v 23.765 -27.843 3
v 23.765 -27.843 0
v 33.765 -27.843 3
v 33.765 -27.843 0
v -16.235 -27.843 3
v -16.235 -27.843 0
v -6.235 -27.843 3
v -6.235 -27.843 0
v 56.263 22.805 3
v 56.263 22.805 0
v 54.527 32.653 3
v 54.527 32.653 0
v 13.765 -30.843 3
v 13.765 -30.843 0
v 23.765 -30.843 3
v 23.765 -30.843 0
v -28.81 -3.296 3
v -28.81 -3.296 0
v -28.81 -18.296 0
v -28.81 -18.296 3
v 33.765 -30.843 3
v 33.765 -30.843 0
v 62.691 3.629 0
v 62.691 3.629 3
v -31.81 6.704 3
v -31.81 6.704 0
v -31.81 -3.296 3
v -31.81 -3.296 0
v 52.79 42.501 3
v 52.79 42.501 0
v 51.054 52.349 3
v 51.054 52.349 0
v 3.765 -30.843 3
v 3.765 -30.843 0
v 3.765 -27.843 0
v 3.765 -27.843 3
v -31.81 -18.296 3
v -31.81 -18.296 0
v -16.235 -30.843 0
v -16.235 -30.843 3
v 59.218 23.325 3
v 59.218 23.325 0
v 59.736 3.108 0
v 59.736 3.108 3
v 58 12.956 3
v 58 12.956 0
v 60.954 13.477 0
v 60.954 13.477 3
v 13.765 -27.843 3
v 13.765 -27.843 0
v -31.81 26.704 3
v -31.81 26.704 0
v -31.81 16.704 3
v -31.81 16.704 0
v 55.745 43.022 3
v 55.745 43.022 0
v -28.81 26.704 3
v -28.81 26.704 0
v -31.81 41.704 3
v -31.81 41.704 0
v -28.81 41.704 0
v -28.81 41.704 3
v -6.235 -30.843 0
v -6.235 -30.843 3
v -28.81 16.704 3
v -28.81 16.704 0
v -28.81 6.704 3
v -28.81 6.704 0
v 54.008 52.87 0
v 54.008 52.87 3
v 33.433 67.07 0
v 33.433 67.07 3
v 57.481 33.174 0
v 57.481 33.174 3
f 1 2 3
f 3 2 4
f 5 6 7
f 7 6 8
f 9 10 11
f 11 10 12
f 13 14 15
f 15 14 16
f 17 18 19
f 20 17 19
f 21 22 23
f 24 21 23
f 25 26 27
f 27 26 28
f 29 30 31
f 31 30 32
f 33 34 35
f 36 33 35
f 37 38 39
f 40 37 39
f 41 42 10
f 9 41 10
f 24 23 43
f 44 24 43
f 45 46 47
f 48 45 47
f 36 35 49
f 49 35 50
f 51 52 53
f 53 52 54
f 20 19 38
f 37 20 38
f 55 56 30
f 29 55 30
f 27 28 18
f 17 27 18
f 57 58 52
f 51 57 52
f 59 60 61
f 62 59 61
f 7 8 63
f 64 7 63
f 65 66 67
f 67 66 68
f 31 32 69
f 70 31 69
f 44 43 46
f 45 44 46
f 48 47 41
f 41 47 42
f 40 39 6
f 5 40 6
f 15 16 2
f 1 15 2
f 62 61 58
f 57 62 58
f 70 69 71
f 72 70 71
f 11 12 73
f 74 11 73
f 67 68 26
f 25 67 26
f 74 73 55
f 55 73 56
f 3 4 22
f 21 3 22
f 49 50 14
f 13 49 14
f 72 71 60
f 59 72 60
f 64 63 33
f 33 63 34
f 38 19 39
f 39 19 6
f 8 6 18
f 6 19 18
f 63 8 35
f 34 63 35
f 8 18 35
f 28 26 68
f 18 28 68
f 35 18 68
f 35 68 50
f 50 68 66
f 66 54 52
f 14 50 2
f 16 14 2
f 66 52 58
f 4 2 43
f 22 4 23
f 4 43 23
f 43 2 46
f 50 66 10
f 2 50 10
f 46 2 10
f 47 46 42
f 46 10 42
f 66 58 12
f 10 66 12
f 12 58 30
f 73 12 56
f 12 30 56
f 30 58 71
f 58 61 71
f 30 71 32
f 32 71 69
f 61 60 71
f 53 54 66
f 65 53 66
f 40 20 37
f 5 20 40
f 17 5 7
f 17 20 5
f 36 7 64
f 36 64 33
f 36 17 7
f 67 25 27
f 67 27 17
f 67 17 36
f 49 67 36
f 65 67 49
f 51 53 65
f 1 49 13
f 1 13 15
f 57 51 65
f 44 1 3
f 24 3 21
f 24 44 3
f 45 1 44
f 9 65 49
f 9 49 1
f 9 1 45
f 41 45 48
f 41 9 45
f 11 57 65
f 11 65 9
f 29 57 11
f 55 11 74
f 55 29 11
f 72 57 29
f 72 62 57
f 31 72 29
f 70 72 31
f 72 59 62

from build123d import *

# Parameters (mm, degrees)
BOSS_EXTRUDE2_DEPTH = 3


with BuildPart() as part:
    # Sketch1 → Boss-Extrude2 (new body)
    with BuildSketch(Plane.XY):
        Polygon((-28.809910954, -18.295958876), (-31.809910954, -18.295958876), (-16.234936413, -30.842678291), (-16.234936413, -27.842678291), (-6.234936413, -27.842678291), (-6.234936413, -30.842678291), (3.765063587, -30.842678291), (3.765063587, -27.842678291), (13.765063587, -27.842678291), (13.765063587, -30.842678291), (23.765063587, -30.842678291), (23.765063587, -27.842678291), (33.765063587, -27.842678291), (33.765063587, -30.842678291), (62.690506023, 3.62932165), (59.736082763, 3.108377117), (57.999600987, 12.956454647), (60.954024246, 13.47739918), (59.217542469, 23.32547671), (56.26311921, 22.804532177), (54.526637433, 32.652609707), (57.481060693, 33.17355424), (55.744578916, 43.02163177), (52.790155657, 42.500687237), (51.05367388, 52.348764767), (54.008097139, 52.8697093), (33.432510355, 67.069893401), (-31.809910954, 41.704041124), (-28.809910954, 41.704041124), (-28.809910954, 26.704041124), (-31.809910954, 26.704041124), (-31.809910954, 16.704041124), (-28.809910954, 16.704041124), (-28.809910954, 6.704041124), (-31.809910954, 6.704041124), (-31.809910954, -3.295958876), (-28.809910954, -3.295958876), align=None)
    extrude(amount=BOSS_EXTRUDE2_DEPTH)


solid = part.part
